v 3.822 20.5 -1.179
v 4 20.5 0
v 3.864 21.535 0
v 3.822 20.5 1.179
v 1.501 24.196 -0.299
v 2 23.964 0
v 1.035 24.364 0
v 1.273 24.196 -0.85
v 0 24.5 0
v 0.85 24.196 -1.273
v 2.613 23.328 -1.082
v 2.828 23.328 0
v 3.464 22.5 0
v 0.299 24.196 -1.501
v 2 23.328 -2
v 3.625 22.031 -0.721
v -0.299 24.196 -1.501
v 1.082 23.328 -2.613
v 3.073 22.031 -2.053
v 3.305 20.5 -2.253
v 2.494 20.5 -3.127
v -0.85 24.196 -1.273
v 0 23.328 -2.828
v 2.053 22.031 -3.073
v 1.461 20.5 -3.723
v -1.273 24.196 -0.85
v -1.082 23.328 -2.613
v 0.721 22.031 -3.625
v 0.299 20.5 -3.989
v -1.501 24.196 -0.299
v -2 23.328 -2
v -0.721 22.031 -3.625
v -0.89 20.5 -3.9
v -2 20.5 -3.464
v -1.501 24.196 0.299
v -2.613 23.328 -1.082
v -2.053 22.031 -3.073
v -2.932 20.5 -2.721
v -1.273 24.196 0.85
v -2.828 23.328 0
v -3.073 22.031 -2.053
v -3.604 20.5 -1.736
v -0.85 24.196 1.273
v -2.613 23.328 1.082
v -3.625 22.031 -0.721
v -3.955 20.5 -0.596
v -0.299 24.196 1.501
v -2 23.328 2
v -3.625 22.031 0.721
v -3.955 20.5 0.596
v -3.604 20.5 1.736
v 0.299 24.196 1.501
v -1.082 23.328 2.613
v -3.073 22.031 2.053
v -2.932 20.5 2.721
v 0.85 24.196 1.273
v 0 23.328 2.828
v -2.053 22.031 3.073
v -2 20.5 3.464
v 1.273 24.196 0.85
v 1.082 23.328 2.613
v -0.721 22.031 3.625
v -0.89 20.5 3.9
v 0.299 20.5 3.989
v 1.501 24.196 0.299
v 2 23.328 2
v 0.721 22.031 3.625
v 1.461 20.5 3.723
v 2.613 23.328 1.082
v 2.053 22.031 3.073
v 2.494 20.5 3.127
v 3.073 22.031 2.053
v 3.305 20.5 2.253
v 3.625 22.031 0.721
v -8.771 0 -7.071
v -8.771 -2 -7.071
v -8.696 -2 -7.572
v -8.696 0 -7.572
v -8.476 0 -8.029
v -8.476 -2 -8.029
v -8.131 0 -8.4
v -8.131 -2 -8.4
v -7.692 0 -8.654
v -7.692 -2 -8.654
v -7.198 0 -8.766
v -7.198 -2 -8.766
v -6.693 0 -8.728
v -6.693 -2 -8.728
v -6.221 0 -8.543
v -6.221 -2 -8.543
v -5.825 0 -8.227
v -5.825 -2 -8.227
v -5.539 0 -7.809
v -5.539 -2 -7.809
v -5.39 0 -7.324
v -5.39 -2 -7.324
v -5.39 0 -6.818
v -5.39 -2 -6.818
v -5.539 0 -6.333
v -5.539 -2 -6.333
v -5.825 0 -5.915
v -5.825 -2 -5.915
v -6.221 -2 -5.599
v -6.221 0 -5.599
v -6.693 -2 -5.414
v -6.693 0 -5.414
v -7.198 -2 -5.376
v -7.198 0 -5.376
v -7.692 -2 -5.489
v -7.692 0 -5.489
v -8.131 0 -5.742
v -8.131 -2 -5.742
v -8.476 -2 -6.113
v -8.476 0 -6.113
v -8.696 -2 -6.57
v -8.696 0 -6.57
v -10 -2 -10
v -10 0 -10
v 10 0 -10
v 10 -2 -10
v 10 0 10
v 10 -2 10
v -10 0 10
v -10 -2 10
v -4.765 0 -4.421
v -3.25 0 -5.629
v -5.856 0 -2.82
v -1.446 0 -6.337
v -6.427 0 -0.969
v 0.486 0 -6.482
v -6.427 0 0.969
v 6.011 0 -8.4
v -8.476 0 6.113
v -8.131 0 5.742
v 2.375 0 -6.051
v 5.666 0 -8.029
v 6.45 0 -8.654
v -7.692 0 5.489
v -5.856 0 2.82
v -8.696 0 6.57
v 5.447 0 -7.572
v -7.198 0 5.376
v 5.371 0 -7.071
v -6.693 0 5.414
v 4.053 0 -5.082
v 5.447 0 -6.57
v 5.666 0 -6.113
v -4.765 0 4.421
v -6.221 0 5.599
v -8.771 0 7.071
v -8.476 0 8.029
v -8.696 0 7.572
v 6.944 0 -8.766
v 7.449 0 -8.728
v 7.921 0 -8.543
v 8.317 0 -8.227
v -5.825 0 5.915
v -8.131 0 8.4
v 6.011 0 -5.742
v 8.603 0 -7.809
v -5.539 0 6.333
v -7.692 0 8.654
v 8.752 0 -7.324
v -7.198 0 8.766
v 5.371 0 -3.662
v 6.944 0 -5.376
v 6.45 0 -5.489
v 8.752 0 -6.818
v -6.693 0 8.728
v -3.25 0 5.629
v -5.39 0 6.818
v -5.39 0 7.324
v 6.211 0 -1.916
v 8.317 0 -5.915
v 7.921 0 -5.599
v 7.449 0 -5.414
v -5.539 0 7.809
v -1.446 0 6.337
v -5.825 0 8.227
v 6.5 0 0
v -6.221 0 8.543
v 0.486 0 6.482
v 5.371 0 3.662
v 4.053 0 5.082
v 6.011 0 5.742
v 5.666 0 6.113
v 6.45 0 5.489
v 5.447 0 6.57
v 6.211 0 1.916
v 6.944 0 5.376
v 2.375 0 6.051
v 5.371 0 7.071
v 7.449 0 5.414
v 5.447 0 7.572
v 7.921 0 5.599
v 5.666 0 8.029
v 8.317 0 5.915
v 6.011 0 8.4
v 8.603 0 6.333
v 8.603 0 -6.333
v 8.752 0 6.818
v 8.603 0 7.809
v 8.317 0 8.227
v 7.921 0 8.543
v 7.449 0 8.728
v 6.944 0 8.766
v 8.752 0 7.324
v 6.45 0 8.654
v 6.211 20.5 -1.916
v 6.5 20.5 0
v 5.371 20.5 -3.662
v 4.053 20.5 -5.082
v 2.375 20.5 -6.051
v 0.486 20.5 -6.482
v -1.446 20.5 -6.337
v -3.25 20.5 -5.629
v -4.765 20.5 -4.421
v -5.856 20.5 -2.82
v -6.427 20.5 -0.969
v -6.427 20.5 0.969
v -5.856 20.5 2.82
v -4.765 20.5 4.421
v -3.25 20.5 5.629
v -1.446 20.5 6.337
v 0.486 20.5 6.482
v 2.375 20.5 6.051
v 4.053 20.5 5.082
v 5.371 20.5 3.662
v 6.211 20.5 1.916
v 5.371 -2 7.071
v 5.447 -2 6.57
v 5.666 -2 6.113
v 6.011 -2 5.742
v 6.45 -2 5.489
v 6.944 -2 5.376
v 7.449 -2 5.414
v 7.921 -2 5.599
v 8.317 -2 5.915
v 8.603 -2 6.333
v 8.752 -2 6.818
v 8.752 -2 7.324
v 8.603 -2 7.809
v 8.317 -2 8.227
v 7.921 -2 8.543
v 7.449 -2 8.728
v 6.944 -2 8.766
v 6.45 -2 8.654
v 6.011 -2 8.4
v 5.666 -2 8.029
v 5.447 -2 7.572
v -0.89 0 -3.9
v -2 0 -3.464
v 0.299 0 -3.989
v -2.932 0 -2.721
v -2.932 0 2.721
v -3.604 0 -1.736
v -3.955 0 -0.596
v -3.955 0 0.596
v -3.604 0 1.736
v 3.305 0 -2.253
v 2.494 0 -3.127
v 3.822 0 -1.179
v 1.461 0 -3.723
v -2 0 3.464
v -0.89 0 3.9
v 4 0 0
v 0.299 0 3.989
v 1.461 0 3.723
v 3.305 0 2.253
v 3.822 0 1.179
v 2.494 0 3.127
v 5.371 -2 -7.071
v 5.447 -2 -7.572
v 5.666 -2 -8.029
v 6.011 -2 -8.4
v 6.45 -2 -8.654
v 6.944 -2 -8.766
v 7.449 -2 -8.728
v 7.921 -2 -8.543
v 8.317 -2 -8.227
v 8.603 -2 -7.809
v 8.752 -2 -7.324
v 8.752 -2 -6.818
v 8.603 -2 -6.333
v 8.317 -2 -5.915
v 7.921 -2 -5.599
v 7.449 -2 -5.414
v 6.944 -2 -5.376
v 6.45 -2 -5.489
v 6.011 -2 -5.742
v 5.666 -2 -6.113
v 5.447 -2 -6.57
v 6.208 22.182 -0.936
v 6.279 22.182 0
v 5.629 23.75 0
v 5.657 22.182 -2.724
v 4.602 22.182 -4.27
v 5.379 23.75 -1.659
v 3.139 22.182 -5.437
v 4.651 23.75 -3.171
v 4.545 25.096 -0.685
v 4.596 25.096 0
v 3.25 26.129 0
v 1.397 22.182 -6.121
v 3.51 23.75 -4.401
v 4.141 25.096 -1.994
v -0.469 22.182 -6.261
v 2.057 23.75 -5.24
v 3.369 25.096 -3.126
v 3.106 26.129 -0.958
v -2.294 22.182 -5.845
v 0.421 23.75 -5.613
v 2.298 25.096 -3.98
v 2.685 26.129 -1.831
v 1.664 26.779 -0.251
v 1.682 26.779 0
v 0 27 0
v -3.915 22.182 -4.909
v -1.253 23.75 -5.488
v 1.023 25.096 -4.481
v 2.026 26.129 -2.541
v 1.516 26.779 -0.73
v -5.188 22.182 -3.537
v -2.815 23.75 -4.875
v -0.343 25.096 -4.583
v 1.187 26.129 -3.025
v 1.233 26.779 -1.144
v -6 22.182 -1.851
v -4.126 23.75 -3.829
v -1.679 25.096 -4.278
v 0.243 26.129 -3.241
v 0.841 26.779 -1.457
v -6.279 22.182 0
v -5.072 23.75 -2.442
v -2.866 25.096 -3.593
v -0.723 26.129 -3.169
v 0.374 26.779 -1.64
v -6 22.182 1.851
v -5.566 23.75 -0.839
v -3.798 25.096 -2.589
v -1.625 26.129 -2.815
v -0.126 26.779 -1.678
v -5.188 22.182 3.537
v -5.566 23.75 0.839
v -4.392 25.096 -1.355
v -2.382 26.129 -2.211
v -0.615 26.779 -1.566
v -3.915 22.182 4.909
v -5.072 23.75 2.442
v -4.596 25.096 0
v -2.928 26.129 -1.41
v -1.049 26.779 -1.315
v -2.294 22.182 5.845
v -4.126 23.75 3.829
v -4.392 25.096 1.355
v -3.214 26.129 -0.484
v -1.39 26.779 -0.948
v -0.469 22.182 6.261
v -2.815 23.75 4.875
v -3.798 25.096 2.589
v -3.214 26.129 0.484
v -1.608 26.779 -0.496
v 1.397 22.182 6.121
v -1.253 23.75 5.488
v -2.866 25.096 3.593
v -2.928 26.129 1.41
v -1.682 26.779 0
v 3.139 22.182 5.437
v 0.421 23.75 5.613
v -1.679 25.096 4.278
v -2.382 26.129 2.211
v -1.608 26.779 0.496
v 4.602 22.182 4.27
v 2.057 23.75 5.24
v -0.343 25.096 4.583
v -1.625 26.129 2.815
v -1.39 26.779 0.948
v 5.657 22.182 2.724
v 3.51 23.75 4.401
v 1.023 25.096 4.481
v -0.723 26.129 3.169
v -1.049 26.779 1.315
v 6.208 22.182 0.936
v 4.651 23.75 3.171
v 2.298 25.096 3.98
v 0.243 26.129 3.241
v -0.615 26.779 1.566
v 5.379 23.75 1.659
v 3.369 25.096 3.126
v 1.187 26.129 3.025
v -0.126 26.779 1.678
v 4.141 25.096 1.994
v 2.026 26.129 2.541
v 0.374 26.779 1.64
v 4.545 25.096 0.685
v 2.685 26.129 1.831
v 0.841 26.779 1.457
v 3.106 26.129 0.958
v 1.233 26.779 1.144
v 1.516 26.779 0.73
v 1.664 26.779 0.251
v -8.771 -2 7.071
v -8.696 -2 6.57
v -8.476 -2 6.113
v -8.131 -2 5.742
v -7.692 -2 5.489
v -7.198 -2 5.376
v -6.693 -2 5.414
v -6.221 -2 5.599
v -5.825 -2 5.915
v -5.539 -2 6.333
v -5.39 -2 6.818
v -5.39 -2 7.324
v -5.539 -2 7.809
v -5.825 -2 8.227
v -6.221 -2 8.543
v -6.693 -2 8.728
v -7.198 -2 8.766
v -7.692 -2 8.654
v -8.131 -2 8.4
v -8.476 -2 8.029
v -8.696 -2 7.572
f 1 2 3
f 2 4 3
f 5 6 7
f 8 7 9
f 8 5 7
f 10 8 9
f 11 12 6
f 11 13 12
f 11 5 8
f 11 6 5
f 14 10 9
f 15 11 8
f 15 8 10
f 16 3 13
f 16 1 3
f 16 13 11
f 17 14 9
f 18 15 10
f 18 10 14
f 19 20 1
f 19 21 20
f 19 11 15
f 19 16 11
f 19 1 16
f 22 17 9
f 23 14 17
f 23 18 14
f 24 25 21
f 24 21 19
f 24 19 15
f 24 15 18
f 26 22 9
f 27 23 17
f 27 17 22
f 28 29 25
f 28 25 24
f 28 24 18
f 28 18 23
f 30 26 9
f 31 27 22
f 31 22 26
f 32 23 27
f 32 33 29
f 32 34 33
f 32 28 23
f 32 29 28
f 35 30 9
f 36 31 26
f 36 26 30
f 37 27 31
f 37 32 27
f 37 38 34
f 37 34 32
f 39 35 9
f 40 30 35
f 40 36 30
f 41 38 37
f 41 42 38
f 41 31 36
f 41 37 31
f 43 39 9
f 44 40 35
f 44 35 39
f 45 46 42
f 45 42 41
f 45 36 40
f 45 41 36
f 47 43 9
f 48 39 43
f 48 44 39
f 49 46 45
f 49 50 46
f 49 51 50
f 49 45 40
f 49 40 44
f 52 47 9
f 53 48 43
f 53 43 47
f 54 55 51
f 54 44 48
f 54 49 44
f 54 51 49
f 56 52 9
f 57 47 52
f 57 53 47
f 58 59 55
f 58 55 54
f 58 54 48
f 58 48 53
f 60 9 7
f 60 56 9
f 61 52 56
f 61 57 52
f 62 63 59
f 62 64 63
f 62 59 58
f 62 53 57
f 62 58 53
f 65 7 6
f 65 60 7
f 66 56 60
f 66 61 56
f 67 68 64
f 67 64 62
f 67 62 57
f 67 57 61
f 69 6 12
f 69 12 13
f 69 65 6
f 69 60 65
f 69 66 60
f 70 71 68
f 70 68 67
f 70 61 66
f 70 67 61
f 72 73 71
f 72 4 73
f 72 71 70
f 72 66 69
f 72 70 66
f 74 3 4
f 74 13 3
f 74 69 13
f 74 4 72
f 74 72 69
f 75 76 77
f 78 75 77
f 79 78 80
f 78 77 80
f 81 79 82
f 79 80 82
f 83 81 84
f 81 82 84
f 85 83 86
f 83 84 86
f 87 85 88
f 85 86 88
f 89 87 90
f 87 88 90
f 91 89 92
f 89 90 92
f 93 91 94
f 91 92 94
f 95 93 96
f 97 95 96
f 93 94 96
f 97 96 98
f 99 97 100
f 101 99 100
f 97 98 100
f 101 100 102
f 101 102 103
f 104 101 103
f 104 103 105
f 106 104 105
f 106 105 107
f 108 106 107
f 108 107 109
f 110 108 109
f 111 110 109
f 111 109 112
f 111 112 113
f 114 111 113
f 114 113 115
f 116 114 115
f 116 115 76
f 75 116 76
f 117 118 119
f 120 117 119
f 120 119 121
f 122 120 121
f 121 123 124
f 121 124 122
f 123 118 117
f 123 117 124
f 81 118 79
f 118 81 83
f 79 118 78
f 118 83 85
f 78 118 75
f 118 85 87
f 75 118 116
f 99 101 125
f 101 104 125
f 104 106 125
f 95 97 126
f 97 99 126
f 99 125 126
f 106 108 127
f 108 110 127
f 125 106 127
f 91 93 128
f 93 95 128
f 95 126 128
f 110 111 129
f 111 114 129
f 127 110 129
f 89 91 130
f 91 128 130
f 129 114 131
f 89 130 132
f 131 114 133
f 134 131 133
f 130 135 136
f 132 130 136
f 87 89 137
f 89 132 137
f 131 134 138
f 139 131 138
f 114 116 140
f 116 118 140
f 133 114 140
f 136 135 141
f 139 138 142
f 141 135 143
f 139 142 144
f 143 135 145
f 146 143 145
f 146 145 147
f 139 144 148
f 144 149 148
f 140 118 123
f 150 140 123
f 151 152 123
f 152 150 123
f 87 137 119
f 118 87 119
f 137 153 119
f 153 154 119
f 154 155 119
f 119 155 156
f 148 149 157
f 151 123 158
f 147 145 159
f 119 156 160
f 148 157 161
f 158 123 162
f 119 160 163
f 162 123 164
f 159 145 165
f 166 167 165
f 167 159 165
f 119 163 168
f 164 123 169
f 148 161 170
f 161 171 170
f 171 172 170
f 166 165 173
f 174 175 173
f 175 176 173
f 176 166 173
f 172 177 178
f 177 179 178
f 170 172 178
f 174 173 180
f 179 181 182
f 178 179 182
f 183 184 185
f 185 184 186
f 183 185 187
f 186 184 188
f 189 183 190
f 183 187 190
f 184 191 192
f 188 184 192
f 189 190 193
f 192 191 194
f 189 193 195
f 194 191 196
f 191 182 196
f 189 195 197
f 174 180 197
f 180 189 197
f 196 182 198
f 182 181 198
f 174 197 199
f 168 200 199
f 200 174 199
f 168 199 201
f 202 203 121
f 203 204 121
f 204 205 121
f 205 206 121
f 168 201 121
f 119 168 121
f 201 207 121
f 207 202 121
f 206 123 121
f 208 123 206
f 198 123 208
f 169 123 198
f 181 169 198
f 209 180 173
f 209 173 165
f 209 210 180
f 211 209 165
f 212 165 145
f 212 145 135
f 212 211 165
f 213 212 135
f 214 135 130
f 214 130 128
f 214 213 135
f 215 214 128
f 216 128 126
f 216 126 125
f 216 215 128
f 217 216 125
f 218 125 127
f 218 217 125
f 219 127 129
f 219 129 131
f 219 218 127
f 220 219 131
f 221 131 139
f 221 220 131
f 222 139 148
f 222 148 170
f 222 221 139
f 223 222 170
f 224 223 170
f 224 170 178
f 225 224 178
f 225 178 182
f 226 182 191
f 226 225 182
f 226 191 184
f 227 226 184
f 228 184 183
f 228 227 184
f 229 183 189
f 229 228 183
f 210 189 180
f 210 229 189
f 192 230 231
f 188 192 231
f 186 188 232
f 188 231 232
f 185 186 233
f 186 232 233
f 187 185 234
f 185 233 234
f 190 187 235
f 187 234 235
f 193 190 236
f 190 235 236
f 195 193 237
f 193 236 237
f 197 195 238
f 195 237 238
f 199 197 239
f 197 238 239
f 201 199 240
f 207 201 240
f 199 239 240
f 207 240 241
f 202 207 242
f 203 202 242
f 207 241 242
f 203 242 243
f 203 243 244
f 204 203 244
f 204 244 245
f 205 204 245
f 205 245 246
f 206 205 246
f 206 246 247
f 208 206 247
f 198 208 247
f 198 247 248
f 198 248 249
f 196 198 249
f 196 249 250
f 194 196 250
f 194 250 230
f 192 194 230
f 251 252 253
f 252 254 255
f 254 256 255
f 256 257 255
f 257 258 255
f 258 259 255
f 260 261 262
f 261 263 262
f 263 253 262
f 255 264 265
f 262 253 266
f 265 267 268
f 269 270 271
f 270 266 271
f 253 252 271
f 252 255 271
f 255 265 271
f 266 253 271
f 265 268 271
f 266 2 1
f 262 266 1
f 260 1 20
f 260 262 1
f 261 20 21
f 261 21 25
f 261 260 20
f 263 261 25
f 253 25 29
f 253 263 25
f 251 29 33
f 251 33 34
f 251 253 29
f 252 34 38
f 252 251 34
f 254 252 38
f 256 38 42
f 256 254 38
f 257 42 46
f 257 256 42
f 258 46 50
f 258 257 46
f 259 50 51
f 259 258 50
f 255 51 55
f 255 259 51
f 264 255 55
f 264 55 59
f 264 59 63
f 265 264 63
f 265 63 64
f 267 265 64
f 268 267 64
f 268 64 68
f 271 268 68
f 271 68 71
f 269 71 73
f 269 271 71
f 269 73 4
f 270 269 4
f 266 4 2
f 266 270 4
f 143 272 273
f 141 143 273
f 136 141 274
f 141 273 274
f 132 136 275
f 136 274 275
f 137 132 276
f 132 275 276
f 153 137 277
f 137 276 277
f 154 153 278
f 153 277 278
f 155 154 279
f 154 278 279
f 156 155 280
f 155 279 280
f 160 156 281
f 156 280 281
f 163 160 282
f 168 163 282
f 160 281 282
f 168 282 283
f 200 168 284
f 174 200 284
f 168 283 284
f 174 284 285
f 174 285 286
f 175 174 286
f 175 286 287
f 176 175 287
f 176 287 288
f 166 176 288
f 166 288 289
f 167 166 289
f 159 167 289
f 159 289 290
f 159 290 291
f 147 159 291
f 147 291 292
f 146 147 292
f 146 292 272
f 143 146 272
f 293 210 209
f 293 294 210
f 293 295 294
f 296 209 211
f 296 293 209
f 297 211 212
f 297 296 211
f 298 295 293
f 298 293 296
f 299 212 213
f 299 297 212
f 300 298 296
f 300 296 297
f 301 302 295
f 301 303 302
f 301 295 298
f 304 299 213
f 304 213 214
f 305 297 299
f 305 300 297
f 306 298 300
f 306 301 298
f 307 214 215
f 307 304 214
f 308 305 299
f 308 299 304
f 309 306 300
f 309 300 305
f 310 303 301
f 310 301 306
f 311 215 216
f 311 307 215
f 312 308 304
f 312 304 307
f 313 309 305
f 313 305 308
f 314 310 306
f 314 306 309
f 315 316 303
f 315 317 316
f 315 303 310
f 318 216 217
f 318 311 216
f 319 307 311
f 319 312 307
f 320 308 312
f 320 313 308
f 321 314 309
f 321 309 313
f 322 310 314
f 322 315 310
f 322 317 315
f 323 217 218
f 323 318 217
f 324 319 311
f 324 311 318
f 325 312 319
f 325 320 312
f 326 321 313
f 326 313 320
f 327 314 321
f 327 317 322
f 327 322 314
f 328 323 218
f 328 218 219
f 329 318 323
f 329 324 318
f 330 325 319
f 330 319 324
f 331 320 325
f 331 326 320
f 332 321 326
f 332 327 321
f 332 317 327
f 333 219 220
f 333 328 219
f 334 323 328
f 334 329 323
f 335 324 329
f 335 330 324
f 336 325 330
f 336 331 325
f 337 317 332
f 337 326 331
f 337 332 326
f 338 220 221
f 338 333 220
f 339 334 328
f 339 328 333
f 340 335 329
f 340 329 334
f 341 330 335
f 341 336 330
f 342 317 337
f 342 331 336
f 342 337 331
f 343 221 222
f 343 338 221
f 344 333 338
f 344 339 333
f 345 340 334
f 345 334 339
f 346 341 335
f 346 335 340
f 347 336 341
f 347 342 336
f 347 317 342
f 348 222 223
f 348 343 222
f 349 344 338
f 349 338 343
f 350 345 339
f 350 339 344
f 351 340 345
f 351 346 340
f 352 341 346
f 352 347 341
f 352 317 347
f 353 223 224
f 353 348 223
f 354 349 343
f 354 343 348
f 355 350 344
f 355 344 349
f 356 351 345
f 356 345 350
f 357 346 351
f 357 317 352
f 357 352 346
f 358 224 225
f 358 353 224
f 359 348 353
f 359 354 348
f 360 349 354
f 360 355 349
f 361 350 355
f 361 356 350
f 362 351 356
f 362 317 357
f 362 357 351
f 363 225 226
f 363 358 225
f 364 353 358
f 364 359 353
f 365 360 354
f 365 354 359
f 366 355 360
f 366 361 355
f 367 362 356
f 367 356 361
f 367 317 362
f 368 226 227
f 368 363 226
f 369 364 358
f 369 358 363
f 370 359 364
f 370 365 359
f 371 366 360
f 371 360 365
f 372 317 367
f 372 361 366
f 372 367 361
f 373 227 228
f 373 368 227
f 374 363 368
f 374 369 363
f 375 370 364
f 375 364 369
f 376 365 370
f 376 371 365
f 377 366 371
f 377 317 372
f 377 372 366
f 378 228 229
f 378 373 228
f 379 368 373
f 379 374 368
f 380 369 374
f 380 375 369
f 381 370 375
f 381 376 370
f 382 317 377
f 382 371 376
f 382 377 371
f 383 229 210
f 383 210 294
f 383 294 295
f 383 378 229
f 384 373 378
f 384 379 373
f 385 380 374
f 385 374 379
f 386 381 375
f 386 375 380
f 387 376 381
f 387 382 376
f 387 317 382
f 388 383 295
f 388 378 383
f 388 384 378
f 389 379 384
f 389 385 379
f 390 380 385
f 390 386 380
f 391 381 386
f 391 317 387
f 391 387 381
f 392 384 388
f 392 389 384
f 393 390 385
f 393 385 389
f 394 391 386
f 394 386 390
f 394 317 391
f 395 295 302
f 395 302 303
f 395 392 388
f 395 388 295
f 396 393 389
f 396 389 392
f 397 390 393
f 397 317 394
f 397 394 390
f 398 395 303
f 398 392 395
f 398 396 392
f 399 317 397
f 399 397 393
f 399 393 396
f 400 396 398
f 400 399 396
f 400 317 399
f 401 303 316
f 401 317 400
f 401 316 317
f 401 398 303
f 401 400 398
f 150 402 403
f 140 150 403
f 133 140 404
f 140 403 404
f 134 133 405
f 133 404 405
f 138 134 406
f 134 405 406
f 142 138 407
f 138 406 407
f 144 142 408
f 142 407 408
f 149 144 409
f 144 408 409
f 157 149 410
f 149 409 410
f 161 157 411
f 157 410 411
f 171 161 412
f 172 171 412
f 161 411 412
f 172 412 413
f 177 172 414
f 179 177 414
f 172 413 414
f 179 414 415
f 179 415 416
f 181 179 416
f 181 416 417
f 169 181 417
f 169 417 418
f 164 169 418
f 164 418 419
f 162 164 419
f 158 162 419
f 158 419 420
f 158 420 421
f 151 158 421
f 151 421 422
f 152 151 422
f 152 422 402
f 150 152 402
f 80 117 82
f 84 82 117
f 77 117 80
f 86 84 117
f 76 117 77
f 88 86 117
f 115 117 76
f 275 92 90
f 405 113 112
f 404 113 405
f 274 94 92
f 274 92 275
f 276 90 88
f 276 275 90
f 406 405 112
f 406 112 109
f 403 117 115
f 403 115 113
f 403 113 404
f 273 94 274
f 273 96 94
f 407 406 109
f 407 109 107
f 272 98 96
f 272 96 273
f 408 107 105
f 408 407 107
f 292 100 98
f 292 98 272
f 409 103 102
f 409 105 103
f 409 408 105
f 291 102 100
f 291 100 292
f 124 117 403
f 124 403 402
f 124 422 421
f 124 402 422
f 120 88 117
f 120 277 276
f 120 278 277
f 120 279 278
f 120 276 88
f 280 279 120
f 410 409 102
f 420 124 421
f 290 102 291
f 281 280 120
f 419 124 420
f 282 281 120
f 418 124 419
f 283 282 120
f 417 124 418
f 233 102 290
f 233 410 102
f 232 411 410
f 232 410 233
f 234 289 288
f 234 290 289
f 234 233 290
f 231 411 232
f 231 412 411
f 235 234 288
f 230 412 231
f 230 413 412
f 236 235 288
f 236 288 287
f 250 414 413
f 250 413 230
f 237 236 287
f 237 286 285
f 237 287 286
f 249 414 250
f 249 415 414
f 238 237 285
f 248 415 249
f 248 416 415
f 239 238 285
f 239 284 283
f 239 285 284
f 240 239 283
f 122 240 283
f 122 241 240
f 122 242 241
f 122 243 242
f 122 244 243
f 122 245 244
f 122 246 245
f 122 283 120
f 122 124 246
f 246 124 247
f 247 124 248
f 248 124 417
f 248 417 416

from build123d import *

# Parameters (mm, degrees)
ESQUISSE3_W          = 20
ESQUISSE3_H          = 20
BOSS_EXTRU_1_DEPTH   = 2
D_GAGEMENT_M31_D     = 3.4
D_GAGEMENT_M31_DEPTH = 3
D_GAGEMENT_M31_TIP   = 1.021463052


with BuildPart() as part:
    # Esquisse2 → Révolution3 (revolve)
    with BuildSketch(Plane.XY):
        with BuildLine():
            Line((4, 0), (6.5, 0))
            Line((6.5, 0), (6.5, 20.5))
            ThreePointArc((6.5, 20.5), (4.596194078, 25.096194078), (0, 27))
            Line((0, 27), (0, 25.944271904))
            Line((0, 25.944271904), (0, 24.5))
            ThreePointArc((0, 24.5), (2.828427125, 23.328427125), (4, 20.5))
            Line((4, 20.5), (4, 0))
        make_face()
    revolve(axis=Axis((0, 0, 0), (0, 1, 0)))

    # Esquisse3 → Boss.-Extru.1 (add)
    with BuildSketch(Plane.XZ):
        Rectangle(ESQUISSE3_W, ESQUISSE3_H)
    extrude(amount=BOSS_EXTRU_1_DEPTH)

    # Dégagement M31
    with Locations(Plane(origin=(0, 0, 0), x_dir=(1, 0, 0), z_dir=(0, 1, 0))):
        with Locations((-7.071067812, 7.071067812), (7.071067812, 7.071067812), (7.071067812, -7.071067812), (-7.071067812, -7.071067812)):
            Hole(D_GAGEMENT_M31_D / 2, depth=D_GAGEMENT_M31_DEPTH)
            with Locations((0, 0, -(D_GAGEMENT_M31_DEPTH + D_GAGEMENT_M31_TIP / 2))):  # 118° drill point
                Cone(0, D_GAGEMENT_M31_D / 2, D_GAGEMENT_M31_TIP, mode=Mode.SUBTRACT)


solid = part.part
